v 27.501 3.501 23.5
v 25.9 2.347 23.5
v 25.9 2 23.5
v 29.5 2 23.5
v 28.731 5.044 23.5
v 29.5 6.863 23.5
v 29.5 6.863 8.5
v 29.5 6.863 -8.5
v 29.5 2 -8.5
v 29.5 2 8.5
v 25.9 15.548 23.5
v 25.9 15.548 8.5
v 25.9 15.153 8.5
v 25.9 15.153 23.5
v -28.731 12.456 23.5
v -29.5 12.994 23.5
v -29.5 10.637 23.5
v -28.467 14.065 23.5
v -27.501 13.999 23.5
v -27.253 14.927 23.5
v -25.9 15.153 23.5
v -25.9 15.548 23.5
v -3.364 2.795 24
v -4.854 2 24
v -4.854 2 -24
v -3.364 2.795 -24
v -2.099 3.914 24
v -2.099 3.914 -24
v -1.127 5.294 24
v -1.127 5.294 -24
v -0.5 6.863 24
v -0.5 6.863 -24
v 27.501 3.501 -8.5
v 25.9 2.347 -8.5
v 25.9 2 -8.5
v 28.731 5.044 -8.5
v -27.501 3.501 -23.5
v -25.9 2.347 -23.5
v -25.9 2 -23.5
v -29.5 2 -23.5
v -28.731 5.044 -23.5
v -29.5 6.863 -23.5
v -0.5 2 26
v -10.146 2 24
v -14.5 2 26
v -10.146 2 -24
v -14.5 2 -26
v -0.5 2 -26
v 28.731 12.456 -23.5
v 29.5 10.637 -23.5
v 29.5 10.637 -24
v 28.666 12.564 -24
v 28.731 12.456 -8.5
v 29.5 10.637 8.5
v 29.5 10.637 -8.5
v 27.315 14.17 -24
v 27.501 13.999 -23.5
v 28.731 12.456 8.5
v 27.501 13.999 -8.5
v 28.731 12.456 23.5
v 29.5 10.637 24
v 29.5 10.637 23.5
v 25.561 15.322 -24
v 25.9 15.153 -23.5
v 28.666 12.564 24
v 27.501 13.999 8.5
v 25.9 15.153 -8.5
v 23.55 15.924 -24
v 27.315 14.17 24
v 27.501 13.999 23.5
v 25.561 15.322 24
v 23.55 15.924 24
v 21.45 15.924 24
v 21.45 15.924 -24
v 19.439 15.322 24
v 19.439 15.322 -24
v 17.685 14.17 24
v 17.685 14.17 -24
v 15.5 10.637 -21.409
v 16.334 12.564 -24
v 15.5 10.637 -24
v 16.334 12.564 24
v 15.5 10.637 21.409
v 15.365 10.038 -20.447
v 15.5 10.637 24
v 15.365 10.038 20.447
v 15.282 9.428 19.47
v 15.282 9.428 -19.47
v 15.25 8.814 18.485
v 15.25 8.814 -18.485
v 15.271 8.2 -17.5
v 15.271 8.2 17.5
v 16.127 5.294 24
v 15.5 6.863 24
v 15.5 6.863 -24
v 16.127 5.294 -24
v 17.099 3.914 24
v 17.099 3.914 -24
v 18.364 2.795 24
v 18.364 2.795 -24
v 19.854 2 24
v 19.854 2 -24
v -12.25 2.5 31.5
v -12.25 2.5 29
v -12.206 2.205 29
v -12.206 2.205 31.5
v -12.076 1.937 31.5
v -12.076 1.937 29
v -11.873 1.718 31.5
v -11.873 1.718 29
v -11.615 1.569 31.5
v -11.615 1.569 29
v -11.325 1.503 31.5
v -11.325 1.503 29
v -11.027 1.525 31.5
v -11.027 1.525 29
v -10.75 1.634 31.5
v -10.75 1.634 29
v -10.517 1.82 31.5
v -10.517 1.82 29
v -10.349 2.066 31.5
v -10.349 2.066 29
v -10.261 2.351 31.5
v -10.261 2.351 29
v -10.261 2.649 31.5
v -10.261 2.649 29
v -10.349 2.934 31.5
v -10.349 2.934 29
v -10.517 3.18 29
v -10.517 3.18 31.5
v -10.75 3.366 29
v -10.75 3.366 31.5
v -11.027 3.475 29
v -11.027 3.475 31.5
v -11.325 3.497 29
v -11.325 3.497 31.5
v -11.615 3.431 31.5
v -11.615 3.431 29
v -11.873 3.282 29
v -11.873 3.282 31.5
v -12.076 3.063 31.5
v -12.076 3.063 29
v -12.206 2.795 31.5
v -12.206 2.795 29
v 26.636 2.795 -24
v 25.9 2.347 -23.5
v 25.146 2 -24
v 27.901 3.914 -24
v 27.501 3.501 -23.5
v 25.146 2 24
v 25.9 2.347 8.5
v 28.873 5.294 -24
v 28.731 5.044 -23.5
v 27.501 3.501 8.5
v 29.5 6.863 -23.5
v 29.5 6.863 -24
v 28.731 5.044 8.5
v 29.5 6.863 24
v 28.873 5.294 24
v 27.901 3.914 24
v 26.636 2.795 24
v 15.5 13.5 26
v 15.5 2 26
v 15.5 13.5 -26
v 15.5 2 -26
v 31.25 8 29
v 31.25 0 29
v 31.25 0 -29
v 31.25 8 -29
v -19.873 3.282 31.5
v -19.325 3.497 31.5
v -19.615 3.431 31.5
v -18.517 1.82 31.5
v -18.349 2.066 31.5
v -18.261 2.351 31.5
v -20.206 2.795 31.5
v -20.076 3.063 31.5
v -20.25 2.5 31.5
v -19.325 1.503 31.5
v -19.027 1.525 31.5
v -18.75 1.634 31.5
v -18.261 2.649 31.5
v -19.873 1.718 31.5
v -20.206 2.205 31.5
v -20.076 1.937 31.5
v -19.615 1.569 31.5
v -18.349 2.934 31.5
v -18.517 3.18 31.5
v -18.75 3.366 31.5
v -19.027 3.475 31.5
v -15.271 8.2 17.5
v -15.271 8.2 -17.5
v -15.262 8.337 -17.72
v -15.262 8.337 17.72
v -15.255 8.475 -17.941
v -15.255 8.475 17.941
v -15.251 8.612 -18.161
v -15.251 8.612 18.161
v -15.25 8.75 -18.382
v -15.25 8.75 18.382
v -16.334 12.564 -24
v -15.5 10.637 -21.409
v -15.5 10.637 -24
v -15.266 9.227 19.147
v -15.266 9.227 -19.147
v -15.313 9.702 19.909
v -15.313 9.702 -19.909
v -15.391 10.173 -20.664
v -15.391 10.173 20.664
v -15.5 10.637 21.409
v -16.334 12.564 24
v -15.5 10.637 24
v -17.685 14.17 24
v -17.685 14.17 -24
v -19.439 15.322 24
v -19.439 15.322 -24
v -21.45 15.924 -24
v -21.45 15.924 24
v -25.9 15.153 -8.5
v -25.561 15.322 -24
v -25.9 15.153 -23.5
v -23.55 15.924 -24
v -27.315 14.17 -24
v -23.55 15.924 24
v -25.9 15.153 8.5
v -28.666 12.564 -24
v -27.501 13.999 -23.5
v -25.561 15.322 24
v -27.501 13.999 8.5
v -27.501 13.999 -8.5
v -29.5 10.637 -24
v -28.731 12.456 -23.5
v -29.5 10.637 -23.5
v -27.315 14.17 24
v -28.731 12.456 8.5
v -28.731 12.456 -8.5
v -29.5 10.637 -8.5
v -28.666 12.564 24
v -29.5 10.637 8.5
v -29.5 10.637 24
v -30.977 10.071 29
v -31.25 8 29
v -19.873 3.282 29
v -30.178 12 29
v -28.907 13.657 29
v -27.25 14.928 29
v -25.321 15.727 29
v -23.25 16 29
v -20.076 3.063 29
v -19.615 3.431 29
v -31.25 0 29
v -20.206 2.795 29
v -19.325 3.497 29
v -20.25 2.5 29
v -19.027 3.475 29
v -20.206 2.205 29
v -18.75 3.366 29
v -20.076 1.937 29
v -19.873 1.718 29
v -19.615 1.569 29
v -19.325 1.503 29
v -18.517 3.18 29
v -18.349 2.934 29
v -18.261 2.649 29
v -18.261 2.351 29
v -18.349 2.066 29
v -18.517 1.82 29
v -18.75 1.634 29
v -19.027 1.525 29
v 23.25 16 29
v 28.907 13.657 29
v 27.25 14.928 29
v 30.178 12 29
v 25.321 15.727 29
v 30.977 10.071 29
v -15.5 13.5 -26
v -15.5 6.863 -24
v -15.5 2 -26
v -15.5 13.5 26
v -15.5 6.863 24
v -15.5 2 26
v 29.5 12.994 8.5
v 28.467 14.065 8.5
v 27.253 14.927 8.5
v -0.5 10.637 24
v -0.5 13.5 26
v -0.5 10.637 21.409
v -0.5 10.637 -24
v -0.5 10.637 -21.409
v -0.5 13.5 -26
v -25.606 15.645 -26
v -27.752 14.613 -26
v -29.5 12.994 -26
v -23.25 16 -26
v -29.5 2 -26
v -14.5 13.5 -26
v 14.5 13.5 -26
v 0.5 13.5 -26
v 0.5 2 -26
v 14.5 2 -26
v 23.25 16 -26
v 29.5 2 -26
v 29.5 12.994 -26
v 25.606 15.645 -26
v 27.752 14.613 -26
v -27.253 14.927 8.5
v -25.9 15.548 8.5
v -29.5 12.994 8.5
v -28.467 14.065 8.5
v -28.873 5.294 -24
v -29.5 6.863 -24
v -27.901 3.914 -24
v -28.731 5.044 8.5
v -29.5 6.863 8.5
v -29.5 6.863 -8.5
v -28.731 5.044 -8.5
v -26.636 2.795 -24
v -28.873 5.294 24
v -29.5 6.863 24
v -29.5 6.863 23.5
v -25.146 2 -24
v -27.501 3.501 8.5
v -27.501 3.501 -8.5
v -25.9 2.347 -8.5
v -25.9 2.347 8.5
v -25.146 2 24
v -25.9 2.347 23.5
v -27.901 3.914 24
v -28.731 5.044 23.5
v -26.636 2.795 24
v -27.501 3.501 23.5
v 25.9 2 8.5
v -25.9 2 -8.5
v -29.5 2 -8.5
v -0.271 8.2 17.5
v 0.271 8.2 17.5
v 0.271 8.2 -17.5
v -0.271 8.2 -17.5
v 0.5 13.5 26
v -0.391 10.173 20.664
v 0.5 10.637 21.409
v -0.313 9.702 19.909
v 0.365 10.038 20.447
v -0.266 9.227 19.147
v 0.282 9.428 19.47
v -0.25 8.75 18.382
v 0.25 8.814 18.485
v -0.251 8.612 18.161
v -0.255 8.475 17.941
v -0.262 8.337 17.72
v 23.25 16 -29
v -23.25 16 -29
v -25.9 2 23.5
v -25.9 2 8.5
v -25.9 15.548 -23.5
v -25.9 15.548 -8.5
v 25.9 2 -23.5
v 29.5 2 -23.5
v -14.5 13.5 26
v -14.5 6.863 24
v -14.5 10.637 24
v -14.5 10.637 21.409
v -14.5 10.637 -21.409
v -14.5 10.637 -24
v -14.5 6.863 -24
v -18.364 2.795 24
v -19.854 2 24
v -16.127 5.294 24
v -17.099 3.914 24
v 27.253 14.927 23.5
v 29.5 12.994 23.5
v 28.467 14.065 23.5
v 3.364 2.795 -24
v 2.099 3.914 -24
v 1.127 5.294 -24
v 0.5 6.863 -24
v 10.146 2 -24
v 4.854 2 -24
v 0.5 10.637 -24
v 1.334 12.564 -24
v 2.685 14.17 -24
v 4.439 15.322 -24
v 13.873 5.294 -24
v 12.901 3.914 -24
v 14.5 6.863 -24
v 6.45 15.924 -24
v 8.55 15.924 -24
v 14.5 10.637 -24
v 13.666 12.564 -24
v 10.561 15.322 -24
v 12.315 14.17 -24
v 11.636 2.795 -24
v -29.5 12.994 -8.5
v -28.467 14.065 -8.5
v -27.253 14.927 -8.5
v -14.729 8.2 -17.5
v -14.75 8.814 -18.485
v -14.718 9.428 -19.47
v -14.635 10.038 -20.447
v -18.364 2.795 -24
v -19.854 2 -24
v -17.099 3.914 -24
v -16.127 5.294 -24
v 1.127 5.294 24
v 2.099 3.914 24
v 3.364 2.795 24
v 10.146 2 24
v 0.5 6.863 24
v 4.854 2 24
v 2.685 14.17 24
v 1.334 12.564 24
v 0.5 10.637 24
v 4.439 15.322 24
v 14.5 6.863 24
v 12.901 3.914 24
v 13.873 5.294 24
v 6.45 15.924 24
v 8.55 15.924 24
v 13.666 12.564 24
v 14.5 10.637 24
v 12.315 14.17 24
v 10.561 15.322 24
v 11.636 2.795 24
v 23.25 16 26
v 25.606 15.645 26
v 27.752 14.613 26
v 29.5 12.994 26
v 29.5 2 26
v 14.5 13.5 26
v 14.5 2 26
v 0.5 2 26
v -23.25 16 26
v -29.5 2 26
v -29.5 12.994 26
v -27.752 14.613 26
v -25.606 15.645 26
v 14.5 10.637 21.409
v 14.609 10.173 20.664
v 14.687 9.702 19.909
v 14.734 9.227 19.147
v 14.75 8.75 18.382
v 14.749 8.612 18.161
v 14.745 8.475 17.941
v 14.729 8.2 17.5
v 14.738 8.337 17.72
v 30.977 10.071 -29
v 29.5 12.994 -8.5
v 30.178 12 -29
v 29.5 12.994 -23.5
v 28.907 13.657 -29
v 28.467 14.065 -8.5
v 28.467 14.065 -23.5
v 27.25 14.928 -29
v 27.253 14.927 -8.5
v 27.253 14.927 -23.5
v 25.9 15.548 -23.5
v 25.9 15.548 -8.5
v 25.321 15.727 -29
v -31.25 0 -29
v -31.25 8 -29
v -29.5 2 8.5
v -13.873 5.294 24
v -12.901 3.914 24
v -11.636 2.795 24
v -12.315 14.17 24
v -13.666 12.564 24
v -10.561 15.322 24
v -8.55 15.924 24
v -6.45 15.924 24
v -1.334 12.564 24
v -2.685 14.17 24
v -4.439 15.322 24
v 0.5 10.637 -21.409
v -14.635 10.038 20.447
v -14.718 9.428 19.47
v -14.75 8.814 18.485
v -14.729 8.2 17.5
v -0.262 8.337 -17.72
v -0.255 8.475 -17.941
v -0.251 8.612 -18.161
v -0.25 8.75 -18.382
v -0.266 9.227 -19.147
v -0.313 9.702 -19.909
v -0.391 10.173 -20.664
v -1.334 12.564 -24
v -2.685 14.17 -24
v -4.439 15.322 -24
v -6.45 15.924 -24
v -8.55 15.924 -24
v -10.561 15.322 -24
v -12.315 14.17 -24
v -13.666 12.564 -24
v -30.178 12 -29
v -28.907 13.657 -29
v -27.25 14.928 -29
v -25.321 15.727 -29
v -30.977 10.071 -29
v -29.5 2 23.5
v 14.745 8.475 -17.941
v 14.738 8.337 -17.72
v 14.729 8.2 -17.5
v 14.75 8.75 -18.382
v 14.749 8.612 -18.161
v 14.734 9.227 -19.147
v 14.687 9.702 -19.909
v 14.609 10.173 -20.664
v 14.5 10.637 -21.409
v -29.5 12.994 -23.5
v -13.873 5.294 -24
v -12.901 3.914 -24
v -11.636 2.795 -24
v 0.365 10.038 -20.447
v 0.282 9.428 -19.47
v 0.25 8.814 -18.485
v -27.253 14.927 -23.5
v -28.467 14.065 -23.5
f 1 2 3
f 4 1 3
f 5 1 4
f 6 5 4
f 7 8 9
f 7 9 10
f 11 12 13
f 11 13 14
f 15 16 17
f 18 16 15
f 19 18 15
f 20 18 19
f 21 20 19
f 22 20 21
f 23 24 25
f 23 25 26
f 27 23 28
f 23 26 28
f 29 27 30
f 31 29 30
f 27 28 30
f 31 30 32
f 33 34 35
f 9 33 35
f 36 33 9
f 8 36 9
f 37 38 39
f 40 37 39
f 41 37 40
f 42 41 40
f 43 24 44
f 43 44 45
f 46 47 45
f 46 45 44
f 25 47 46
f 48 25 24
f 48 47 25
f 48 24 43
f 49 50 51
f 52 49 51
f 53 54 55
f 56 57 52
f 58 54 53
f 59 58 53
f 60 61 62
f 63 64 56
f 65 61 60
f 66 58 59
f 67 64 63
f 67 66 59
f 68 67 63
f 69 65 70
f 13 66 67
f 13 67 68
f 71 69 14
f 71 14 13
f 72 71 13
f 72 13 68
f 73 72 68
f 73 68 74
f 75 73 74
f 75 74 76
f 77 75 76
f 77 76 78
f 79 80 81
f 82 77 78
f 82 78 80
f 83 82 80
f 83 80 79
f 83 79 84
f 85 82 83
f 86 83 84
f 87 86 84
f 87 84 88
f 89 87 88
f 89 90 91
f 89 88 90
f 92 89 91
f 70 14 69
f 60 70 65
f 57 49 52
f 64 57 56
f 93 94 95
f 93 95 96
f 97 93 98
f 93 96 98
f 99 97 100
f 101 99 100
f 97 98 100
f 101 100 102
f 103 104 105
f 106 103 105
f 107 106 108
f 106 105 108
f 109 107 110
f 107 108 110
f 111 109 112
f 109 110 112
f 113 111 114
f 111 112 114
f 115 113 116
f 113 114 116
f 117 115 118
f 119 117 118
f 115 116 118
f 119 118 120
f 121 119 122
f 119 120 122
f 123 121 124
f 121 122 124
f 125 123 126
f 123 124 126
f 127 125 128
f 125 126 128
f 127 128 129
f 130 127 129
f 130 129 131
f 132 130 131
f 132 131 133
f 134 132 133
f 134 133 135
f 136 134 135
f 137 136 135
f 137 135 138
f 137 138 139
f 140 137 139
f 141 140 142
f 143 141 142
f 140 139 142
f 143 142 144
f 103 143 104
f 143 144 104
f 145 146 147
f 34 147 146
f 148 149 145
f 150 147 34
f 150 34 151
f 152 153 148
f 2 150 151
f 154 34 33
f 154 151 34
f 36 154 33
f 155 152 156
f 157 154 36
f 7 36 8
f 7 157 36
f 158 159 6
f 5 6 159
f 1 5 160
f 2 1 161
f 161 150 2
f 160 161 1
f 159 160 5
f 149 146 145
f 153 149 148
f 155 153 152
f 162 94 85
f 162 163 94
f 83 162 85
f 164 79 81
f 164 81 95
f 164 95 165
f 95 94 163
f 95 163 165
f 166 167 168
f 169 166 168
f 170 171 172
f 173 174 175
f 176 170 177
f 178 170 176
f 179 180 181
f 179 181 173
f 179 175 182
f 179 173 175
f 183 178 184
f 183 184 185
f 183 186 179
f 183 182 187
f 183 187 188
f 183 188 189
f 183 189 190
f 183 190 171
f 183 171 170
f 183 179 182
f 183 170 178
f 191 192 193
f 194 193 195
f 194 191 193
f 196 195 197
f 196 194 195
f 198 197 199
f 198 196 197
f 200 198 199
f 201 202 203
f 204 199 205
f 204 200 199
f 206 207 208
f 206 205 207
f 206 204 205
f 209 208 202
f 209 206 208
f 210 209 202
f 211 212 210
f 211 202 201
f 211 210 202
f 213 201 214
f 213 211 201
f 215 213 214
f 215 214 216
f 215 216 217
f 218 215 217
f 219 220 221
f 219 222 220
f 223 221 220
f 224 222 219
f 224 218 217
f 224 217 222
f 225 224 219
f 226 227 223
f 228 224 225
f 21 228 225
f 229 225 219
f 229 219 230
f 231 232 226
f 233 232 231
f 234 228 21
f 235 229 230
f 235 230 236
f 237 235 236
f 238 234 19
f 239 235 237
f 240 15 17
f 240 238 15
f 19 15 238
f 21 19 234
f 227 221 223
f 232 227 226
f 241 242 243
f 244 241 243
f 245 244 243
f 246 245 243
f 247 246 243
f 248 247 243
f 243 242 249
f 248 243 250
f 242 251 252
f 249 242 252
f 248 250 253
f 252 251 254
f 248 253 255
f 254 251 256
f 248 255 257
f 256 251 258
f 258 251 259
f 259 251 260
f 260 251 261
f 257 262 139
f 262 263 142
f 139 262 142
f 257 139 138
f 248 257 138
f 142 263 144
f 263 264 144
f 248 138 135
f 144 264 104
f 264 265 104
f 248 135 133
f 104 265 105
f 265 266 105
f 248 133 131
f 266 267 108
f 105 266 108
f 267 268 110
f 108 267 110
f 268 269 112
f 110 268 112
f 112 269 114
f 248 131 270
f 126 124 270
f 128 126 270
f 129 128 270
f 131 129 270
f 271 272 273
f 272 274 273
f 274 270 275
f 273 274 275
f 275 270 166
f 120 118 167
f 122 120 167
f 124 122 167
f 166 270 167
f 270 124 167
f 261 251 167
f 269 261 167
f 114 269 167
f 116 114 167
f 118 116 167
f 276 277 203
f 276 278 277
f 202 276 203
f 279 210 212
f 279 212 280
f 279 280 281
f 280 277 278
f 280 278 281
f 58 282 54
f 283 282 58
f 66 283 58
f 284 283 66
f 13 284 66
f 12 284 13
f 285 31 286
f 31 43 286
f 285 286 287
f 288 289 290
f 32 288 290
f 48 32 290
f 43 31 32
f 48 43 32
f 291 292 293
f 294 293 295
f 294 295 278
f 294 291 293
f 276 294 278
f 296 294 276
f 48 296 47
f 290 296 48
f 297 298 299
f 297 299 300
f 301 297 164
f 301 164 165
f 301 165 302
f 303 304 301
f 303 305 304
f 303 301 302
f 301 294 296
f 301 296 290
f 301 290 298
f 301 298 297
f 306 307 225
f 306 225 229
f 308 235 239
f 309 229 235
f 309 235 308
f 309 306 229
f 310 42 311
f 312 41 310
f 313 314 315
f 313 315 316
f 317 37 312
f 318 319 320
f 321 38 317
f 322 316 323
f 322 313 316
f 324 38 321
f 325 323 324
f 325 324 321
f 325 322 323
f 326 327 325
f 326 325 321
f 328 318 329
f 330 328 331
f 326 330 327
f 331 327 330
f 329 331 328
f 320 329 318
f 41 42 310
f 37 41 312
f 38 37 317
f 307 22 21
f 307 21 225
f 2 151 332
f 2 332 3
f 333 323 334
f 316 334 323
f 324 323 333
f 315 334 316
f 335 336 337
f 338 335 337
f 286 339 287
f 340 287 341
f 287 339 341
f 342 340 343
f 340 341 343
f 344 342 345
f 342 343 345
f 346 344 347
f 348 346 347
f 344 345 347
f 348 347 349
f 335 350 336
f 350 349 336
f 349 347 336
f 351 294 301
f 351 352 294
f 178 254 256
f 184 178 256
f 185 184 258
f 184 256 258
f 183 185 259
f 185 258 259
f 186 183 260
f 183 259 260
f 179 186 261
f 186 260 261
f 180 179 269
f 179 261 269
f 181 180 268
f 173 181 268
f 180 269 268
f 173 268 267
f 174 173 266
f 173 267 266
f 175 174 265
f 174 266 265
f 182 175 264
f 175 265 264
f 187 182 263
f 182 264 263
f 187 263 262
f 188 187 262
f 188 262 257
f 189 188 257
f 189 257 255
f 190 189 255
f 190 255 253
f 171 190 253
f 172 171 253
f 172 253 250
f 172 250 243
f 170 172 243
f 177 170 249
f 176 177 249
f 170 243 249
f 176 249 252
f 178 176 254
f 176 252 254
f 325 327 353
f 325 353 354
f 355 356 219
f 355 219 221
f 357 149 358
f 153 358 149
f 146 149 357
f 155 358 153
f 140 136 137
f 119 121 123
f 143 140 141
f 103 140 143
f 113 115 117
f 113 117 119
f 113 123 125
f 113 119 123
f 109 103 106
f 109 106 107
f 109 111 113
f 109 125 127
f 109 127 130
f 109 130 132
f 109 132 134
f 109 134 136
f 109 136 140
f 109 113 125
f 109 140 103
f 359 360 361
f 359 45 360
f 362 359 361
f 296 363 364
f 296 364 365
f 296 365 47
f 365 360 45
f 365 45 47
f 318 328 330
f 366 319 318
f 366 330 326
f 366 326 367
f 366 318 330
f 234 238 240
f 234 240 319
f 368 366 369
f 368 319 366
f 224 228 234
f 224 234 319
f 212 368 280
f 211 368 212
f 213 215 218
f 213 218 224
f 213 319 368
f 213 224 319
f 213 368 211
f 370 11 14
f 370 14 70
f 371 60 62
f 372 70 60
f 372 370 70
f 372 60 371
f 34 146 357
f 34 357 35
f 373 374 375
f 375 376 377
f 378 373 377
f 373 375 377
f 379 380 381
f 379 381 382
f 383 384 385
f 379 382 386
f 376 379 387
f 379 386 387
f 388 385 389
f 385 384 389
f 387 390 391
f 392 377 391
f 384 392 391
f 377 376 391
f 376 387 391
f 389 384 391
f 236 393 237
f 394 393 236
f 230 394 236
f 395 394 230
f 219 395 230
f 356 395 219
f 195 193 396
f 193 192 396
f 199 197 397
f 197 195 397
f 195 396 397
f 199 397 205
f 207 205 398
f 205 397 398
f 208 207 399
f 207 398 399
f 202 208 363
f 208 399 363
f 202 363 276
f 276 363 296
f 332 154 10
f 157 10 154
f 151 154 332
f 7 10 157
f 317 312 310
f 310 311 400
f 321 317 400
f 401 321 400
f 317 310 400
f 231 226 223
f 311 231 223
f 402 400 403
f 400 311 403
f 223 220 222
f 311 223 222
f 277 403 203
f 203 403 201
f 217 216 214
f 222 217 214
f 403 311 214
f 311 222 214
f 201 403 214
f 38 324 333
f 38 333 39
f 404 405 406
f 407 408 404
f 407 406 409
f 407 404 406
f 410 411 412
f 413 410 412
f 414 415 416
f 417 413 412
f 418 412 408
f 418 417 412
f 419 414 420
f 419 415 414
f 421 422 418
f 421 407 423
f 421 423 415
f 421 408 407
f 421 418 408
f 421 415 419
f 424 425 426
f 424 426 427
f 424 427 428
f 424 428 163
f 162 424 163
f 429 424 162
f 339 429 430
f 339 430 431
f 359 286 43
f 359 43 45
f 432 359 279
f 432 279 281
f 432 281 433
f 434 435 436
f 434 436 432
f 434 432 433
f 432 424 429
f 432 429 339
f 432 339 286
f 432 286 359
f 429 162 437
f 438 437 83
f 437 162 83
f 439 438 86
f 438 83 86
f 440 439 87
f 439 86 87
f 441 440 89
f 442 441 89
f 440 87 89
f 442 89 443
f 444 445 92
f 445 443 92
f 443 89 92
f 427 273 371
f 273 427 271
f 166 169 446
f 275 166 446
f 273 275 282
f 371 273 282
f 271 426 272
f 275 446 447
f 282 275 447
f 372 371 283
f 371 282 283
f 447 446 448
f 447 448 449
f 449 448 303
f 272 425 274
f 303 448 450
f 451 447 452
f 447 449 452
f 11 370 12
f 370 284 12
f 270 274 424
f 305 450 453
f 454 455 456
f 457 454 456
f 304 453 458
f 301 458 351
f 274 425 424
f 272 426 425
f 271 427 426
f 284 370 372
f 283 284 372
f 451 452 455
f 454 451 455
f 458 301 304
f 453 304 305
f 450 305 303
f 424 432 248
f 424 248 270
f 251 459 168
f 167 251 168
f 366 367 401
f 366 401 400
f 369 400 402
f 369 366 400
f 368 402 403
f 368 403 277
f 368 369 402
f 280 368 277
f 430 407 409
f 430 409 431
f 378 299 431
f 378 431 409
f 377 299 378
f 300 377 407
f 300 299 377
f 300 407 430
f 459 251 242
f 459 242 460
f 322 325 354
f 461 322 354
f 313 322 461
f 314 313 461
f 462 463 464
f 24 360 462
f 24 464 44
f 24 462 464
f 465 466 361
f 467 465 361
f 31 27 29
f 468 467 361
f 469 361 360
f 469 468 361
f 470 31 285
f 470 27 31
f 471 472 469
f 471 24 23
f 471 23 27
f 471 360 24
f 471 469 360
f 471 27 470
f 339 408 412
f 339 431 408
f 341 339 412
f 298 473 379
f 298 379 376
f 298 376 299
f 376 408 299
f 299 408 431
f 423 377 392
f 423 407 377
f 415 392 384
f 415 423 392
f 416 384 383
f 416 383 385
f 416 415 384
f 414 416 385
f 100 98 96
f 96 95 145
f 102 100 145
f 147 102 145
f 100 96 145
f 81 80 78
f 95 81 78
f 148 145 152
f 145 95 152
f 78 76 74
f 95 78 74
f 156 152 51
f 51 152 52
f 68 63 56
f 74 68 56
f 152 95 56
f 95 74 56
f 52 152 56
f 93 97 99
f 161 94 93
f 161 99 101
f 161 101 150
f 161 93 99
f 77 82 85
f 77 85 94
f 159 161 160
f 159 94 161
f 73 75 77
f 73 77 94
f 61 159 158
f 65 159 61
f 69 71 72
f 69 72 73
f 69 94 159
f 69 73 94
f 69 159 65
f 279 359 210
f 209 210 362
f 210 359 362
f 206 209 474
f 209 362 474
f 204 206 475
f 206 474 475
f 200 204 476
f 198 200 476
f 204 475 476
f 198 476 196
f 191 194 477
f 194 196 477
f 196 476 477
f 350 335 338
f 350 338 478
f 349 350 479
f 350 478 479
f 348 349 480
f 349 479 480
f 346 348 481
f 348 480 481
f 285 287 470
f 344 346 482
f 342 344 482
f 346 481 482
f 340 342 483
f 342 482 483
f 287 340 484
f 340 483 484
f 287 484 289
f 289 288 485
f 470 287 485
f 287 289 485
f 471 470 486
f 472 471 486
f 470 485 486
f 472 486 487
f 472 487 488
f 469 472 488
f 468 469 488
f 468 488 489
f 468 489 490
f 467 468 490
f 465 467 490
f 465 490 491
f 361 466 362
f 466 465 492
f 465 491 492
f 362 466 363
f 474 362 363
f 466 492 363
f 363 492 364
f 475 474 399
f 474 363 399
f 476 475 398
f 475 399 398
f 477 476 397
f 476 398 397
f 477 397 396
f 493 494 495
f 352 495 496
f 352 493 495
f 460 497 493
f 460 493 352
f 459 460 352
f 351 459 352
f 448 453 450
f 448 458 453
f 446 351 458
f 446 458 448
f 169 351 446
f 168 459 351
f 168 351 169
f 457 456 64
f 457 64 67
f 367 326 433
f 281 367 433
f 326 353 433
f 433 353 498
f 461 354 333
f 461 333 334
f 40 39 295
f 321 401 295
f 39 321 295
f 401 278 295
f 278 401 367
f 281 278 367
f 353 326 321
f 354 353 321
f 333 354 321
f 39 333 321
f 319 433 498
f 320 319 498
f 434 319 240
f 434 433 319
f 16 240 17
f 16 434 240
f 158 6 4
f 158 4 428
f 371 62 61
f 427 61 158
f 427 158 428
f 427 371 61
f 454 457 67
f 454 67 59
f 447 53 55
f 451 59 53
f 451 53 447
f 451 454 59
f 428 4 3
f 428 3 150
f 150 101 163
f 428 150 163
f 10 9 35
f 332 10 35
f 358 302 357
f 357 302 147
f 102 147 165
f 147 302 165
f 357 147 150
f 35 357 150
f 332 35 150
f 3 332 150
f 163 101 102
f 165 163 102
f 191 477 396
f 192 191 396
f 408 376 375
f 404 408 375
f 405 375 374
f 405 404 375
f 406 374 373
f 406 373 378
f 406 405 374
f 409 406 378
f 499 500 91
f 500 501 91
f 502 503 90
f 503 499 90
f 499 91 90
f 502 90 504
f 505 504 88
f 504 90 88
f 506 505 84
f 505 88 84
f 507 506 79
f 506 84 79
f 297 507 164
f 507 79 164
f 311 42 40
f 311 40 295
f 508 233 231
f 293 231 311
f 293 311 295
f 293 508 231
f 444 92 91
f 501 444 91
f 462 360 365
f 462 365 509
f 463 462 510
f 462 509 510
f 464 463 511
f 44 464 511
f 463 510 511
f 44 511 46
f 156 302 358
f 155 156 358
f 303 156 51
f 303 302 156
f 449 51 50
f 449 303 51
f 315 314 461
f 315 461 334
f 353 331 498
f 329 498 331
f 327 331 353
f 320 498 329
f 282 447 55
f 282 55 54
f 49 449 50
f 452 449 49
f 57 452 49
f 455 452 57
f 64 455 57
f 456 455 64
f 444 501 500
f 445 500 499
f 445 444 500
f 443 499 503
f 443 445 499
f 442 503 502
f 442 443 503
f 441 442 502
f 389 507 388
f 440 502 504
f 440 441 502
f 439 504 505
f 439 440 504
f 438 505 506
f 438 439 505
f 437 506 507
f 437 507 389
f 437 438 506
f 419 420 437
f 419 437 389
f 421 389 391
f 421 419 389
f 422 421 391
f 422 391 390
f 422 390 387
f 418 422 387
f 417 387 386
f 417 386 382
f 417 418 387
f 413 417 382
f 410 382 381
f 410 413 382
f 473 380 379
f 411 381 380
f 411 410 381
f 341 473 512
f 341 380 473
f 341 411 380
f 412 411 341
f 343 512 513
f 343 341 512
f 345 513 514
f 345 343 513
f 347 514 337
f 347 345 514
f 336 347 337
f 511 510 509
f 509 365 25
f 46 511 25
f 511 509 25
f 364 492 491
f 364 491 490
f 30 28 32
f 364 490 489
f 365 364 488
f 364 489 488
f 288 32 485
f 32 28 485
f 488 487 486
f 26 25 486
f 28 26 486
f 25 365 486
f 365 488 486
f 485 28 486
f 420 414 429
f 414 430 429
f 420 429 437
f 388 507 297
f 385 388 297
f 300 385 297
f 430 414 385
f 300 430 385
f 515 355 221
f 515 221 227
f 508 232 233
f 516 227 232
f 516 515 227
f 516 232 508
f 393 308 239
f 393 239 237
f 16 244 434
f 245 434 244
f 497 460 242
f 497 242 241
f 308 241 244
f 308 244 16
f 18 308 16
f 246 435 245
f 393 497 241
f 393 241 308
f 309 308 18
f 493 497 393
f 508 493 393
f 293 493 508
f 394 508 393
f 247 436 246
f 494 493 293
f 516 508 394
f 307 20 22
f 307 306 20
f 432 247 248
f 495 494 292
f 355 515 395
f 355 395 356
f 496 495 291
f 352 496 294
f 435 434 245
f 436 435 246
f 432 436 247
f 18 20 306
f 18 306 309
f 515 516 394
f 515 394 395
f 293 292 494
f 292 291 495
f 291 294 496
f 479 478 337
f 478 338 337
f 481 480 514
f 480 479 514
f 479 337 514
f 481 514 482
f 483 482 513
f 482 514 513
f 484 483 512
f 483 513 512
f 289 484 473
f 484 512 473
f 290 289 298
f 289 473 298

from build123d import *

# Parameters (mm, degrees)
SKETCH1_W           = 62.5
SKETCH1_H           = 58
BOSS_EXTRUDE1_DEPTH = 16
FILLET1_R           = 8
SKETCH2_W           = 14
SKETCH2_H           = 52
CUT_EXTRUDE1_DEPTH  = 14
CUT_EXTRUDE2_REACH  = 59.294
SKETCH4_R           = 7.25
BOSS_EXTRUDE3_DEPTH = 24
SKETCH6_R           = 1
BOSS_EXTRUDE5_DEPTH = 2.5


with BuildPart() as part:
    # Sketch1 → Boss-Extrude1 (new body)
    with BuildSketch(Plane(origin=(0, 0, 0), x_dir=(1, 0, 0), z_dir=(0, 1, 0))):
        Rectangle(SKETCH1_W, SKETCH1_H)
    extrude(amount=BOSS_EXTRUDE1_DEPTH)

    # Fillet1
    fillet1_edges = [part.edges().sort_by_distance(p)[0] for p in [
        (-31.25, 16, 0),
        (31.25, 16, 0),
    ]]
    fillet(fillet1_edges, radius=FILLET1_R)

    # Sketch2 → Cut-Extrude1 (cut)
    with BuildSketch(Plane(origin=(0, 16, 0), x_dir=(1, 0, 0), z_dir=(0, 1, 0))):
        Polygon((-29.5, 26), (-15.5, 26), (-15.5, -26), (-29.5, -26), (-29.5, -23.5), (-25.9, -23.5), (-25.9, -8.5), (-29.5, -8.5), (-29.5, 8.5), (-25.9, 8.5), (-25.9, 23.5), (-29.5, 23.5), align=None)
        with Locations((-7.5, 0)):
            Rectangle(SKETCH2_W, SKETCH2_H)
        Polygon((15.5, 26), (29.5, 26), (29.5, 23.5), (25.9, 23.5), (25.9, 8.5), (29.5, 8.5), (29.5, -8.5), (25.9, -8.5), (25.9, -23.5), (29.5, -23.5), (29.5, -26), (15.5, -26), align=None)
        with Locations((7.5, 0)):
            Rectangle(SKETCH2_W, SKETCH2_H)
    extrude(amount=-CUT_EXTRUDE1_DEPTH, mode=Mode.SUBTRACT)

    # Cut-Extrude2: up to this face of the body (flat: up to its plane)
    cut_extrude2_end = Plane(part.part.faces().sort_by_distance((-15.5, 9, 0))[0])
    # Sketch3 → Cut-Extrude2 (cut, up to the picked face)
    with BuildSketch(Plane(origin=(15.5, 0, 0), x_dir=(0, 0, -1), z_dir=(1, 0, 0)), mode=Mode.PRIVATE) as cut_extrude2_sk1:
        Polygon((-26, 16), (-26, 13.5), (-17.5, 8.2), (17.5, 8.2), (26, 13.5), (26, 16), align=None)
    cut_extrude2_tool1 = split(extrude(cut_extrude2_sk1.sketch, amount=-CUT_EXTRUDE2_REACH, mode=Mode.PRIVATE), bisect_by=cut_extrude2_end, keep=Keep.BOTH, mode=Mode.PRIVATE)
    add(cut_extrude2_tool1.solids().sort_by(Axis((15.5, 12.366556, 0), (-1, 0, 0)))[0], mode=Mode.SUBTRACT)

    # Sketch4 → Boss-Extrude3 (add, symmetric)
    with BuildSketch(Plane.XY):
        with Locations((-22.5, 8.75)):
            Circle(SKETCH4_R)
        with Locations((-7.5, 8.75)):
            Circle(SKETCH4_R)
        with Locations((22.5, 8.75)):
            Circle(SKETCH4_R)
        with Locations((7.5, 8.75)):
            Circle(SKETCH4_R)
    extrude(amount=BOSS_EXTRUDE3_DEPTH, both=True)

    # Sketch6 → Boss-Extrude5 (add)
    with BuildSketch(Plane.XY.offset(29)):
        with Locations(Location((-19.25, 2.5, 0), (0, 0, 180))):
            Circle(SKETCH6_R)
        with Locations(Location((-11.25, 2.5, 0), (0, 0, 180))):
            Circle(SKETCH6_R)
    extrude(amount=BOSS_EXTRUDE5_DEPTH)


solid = part.part
